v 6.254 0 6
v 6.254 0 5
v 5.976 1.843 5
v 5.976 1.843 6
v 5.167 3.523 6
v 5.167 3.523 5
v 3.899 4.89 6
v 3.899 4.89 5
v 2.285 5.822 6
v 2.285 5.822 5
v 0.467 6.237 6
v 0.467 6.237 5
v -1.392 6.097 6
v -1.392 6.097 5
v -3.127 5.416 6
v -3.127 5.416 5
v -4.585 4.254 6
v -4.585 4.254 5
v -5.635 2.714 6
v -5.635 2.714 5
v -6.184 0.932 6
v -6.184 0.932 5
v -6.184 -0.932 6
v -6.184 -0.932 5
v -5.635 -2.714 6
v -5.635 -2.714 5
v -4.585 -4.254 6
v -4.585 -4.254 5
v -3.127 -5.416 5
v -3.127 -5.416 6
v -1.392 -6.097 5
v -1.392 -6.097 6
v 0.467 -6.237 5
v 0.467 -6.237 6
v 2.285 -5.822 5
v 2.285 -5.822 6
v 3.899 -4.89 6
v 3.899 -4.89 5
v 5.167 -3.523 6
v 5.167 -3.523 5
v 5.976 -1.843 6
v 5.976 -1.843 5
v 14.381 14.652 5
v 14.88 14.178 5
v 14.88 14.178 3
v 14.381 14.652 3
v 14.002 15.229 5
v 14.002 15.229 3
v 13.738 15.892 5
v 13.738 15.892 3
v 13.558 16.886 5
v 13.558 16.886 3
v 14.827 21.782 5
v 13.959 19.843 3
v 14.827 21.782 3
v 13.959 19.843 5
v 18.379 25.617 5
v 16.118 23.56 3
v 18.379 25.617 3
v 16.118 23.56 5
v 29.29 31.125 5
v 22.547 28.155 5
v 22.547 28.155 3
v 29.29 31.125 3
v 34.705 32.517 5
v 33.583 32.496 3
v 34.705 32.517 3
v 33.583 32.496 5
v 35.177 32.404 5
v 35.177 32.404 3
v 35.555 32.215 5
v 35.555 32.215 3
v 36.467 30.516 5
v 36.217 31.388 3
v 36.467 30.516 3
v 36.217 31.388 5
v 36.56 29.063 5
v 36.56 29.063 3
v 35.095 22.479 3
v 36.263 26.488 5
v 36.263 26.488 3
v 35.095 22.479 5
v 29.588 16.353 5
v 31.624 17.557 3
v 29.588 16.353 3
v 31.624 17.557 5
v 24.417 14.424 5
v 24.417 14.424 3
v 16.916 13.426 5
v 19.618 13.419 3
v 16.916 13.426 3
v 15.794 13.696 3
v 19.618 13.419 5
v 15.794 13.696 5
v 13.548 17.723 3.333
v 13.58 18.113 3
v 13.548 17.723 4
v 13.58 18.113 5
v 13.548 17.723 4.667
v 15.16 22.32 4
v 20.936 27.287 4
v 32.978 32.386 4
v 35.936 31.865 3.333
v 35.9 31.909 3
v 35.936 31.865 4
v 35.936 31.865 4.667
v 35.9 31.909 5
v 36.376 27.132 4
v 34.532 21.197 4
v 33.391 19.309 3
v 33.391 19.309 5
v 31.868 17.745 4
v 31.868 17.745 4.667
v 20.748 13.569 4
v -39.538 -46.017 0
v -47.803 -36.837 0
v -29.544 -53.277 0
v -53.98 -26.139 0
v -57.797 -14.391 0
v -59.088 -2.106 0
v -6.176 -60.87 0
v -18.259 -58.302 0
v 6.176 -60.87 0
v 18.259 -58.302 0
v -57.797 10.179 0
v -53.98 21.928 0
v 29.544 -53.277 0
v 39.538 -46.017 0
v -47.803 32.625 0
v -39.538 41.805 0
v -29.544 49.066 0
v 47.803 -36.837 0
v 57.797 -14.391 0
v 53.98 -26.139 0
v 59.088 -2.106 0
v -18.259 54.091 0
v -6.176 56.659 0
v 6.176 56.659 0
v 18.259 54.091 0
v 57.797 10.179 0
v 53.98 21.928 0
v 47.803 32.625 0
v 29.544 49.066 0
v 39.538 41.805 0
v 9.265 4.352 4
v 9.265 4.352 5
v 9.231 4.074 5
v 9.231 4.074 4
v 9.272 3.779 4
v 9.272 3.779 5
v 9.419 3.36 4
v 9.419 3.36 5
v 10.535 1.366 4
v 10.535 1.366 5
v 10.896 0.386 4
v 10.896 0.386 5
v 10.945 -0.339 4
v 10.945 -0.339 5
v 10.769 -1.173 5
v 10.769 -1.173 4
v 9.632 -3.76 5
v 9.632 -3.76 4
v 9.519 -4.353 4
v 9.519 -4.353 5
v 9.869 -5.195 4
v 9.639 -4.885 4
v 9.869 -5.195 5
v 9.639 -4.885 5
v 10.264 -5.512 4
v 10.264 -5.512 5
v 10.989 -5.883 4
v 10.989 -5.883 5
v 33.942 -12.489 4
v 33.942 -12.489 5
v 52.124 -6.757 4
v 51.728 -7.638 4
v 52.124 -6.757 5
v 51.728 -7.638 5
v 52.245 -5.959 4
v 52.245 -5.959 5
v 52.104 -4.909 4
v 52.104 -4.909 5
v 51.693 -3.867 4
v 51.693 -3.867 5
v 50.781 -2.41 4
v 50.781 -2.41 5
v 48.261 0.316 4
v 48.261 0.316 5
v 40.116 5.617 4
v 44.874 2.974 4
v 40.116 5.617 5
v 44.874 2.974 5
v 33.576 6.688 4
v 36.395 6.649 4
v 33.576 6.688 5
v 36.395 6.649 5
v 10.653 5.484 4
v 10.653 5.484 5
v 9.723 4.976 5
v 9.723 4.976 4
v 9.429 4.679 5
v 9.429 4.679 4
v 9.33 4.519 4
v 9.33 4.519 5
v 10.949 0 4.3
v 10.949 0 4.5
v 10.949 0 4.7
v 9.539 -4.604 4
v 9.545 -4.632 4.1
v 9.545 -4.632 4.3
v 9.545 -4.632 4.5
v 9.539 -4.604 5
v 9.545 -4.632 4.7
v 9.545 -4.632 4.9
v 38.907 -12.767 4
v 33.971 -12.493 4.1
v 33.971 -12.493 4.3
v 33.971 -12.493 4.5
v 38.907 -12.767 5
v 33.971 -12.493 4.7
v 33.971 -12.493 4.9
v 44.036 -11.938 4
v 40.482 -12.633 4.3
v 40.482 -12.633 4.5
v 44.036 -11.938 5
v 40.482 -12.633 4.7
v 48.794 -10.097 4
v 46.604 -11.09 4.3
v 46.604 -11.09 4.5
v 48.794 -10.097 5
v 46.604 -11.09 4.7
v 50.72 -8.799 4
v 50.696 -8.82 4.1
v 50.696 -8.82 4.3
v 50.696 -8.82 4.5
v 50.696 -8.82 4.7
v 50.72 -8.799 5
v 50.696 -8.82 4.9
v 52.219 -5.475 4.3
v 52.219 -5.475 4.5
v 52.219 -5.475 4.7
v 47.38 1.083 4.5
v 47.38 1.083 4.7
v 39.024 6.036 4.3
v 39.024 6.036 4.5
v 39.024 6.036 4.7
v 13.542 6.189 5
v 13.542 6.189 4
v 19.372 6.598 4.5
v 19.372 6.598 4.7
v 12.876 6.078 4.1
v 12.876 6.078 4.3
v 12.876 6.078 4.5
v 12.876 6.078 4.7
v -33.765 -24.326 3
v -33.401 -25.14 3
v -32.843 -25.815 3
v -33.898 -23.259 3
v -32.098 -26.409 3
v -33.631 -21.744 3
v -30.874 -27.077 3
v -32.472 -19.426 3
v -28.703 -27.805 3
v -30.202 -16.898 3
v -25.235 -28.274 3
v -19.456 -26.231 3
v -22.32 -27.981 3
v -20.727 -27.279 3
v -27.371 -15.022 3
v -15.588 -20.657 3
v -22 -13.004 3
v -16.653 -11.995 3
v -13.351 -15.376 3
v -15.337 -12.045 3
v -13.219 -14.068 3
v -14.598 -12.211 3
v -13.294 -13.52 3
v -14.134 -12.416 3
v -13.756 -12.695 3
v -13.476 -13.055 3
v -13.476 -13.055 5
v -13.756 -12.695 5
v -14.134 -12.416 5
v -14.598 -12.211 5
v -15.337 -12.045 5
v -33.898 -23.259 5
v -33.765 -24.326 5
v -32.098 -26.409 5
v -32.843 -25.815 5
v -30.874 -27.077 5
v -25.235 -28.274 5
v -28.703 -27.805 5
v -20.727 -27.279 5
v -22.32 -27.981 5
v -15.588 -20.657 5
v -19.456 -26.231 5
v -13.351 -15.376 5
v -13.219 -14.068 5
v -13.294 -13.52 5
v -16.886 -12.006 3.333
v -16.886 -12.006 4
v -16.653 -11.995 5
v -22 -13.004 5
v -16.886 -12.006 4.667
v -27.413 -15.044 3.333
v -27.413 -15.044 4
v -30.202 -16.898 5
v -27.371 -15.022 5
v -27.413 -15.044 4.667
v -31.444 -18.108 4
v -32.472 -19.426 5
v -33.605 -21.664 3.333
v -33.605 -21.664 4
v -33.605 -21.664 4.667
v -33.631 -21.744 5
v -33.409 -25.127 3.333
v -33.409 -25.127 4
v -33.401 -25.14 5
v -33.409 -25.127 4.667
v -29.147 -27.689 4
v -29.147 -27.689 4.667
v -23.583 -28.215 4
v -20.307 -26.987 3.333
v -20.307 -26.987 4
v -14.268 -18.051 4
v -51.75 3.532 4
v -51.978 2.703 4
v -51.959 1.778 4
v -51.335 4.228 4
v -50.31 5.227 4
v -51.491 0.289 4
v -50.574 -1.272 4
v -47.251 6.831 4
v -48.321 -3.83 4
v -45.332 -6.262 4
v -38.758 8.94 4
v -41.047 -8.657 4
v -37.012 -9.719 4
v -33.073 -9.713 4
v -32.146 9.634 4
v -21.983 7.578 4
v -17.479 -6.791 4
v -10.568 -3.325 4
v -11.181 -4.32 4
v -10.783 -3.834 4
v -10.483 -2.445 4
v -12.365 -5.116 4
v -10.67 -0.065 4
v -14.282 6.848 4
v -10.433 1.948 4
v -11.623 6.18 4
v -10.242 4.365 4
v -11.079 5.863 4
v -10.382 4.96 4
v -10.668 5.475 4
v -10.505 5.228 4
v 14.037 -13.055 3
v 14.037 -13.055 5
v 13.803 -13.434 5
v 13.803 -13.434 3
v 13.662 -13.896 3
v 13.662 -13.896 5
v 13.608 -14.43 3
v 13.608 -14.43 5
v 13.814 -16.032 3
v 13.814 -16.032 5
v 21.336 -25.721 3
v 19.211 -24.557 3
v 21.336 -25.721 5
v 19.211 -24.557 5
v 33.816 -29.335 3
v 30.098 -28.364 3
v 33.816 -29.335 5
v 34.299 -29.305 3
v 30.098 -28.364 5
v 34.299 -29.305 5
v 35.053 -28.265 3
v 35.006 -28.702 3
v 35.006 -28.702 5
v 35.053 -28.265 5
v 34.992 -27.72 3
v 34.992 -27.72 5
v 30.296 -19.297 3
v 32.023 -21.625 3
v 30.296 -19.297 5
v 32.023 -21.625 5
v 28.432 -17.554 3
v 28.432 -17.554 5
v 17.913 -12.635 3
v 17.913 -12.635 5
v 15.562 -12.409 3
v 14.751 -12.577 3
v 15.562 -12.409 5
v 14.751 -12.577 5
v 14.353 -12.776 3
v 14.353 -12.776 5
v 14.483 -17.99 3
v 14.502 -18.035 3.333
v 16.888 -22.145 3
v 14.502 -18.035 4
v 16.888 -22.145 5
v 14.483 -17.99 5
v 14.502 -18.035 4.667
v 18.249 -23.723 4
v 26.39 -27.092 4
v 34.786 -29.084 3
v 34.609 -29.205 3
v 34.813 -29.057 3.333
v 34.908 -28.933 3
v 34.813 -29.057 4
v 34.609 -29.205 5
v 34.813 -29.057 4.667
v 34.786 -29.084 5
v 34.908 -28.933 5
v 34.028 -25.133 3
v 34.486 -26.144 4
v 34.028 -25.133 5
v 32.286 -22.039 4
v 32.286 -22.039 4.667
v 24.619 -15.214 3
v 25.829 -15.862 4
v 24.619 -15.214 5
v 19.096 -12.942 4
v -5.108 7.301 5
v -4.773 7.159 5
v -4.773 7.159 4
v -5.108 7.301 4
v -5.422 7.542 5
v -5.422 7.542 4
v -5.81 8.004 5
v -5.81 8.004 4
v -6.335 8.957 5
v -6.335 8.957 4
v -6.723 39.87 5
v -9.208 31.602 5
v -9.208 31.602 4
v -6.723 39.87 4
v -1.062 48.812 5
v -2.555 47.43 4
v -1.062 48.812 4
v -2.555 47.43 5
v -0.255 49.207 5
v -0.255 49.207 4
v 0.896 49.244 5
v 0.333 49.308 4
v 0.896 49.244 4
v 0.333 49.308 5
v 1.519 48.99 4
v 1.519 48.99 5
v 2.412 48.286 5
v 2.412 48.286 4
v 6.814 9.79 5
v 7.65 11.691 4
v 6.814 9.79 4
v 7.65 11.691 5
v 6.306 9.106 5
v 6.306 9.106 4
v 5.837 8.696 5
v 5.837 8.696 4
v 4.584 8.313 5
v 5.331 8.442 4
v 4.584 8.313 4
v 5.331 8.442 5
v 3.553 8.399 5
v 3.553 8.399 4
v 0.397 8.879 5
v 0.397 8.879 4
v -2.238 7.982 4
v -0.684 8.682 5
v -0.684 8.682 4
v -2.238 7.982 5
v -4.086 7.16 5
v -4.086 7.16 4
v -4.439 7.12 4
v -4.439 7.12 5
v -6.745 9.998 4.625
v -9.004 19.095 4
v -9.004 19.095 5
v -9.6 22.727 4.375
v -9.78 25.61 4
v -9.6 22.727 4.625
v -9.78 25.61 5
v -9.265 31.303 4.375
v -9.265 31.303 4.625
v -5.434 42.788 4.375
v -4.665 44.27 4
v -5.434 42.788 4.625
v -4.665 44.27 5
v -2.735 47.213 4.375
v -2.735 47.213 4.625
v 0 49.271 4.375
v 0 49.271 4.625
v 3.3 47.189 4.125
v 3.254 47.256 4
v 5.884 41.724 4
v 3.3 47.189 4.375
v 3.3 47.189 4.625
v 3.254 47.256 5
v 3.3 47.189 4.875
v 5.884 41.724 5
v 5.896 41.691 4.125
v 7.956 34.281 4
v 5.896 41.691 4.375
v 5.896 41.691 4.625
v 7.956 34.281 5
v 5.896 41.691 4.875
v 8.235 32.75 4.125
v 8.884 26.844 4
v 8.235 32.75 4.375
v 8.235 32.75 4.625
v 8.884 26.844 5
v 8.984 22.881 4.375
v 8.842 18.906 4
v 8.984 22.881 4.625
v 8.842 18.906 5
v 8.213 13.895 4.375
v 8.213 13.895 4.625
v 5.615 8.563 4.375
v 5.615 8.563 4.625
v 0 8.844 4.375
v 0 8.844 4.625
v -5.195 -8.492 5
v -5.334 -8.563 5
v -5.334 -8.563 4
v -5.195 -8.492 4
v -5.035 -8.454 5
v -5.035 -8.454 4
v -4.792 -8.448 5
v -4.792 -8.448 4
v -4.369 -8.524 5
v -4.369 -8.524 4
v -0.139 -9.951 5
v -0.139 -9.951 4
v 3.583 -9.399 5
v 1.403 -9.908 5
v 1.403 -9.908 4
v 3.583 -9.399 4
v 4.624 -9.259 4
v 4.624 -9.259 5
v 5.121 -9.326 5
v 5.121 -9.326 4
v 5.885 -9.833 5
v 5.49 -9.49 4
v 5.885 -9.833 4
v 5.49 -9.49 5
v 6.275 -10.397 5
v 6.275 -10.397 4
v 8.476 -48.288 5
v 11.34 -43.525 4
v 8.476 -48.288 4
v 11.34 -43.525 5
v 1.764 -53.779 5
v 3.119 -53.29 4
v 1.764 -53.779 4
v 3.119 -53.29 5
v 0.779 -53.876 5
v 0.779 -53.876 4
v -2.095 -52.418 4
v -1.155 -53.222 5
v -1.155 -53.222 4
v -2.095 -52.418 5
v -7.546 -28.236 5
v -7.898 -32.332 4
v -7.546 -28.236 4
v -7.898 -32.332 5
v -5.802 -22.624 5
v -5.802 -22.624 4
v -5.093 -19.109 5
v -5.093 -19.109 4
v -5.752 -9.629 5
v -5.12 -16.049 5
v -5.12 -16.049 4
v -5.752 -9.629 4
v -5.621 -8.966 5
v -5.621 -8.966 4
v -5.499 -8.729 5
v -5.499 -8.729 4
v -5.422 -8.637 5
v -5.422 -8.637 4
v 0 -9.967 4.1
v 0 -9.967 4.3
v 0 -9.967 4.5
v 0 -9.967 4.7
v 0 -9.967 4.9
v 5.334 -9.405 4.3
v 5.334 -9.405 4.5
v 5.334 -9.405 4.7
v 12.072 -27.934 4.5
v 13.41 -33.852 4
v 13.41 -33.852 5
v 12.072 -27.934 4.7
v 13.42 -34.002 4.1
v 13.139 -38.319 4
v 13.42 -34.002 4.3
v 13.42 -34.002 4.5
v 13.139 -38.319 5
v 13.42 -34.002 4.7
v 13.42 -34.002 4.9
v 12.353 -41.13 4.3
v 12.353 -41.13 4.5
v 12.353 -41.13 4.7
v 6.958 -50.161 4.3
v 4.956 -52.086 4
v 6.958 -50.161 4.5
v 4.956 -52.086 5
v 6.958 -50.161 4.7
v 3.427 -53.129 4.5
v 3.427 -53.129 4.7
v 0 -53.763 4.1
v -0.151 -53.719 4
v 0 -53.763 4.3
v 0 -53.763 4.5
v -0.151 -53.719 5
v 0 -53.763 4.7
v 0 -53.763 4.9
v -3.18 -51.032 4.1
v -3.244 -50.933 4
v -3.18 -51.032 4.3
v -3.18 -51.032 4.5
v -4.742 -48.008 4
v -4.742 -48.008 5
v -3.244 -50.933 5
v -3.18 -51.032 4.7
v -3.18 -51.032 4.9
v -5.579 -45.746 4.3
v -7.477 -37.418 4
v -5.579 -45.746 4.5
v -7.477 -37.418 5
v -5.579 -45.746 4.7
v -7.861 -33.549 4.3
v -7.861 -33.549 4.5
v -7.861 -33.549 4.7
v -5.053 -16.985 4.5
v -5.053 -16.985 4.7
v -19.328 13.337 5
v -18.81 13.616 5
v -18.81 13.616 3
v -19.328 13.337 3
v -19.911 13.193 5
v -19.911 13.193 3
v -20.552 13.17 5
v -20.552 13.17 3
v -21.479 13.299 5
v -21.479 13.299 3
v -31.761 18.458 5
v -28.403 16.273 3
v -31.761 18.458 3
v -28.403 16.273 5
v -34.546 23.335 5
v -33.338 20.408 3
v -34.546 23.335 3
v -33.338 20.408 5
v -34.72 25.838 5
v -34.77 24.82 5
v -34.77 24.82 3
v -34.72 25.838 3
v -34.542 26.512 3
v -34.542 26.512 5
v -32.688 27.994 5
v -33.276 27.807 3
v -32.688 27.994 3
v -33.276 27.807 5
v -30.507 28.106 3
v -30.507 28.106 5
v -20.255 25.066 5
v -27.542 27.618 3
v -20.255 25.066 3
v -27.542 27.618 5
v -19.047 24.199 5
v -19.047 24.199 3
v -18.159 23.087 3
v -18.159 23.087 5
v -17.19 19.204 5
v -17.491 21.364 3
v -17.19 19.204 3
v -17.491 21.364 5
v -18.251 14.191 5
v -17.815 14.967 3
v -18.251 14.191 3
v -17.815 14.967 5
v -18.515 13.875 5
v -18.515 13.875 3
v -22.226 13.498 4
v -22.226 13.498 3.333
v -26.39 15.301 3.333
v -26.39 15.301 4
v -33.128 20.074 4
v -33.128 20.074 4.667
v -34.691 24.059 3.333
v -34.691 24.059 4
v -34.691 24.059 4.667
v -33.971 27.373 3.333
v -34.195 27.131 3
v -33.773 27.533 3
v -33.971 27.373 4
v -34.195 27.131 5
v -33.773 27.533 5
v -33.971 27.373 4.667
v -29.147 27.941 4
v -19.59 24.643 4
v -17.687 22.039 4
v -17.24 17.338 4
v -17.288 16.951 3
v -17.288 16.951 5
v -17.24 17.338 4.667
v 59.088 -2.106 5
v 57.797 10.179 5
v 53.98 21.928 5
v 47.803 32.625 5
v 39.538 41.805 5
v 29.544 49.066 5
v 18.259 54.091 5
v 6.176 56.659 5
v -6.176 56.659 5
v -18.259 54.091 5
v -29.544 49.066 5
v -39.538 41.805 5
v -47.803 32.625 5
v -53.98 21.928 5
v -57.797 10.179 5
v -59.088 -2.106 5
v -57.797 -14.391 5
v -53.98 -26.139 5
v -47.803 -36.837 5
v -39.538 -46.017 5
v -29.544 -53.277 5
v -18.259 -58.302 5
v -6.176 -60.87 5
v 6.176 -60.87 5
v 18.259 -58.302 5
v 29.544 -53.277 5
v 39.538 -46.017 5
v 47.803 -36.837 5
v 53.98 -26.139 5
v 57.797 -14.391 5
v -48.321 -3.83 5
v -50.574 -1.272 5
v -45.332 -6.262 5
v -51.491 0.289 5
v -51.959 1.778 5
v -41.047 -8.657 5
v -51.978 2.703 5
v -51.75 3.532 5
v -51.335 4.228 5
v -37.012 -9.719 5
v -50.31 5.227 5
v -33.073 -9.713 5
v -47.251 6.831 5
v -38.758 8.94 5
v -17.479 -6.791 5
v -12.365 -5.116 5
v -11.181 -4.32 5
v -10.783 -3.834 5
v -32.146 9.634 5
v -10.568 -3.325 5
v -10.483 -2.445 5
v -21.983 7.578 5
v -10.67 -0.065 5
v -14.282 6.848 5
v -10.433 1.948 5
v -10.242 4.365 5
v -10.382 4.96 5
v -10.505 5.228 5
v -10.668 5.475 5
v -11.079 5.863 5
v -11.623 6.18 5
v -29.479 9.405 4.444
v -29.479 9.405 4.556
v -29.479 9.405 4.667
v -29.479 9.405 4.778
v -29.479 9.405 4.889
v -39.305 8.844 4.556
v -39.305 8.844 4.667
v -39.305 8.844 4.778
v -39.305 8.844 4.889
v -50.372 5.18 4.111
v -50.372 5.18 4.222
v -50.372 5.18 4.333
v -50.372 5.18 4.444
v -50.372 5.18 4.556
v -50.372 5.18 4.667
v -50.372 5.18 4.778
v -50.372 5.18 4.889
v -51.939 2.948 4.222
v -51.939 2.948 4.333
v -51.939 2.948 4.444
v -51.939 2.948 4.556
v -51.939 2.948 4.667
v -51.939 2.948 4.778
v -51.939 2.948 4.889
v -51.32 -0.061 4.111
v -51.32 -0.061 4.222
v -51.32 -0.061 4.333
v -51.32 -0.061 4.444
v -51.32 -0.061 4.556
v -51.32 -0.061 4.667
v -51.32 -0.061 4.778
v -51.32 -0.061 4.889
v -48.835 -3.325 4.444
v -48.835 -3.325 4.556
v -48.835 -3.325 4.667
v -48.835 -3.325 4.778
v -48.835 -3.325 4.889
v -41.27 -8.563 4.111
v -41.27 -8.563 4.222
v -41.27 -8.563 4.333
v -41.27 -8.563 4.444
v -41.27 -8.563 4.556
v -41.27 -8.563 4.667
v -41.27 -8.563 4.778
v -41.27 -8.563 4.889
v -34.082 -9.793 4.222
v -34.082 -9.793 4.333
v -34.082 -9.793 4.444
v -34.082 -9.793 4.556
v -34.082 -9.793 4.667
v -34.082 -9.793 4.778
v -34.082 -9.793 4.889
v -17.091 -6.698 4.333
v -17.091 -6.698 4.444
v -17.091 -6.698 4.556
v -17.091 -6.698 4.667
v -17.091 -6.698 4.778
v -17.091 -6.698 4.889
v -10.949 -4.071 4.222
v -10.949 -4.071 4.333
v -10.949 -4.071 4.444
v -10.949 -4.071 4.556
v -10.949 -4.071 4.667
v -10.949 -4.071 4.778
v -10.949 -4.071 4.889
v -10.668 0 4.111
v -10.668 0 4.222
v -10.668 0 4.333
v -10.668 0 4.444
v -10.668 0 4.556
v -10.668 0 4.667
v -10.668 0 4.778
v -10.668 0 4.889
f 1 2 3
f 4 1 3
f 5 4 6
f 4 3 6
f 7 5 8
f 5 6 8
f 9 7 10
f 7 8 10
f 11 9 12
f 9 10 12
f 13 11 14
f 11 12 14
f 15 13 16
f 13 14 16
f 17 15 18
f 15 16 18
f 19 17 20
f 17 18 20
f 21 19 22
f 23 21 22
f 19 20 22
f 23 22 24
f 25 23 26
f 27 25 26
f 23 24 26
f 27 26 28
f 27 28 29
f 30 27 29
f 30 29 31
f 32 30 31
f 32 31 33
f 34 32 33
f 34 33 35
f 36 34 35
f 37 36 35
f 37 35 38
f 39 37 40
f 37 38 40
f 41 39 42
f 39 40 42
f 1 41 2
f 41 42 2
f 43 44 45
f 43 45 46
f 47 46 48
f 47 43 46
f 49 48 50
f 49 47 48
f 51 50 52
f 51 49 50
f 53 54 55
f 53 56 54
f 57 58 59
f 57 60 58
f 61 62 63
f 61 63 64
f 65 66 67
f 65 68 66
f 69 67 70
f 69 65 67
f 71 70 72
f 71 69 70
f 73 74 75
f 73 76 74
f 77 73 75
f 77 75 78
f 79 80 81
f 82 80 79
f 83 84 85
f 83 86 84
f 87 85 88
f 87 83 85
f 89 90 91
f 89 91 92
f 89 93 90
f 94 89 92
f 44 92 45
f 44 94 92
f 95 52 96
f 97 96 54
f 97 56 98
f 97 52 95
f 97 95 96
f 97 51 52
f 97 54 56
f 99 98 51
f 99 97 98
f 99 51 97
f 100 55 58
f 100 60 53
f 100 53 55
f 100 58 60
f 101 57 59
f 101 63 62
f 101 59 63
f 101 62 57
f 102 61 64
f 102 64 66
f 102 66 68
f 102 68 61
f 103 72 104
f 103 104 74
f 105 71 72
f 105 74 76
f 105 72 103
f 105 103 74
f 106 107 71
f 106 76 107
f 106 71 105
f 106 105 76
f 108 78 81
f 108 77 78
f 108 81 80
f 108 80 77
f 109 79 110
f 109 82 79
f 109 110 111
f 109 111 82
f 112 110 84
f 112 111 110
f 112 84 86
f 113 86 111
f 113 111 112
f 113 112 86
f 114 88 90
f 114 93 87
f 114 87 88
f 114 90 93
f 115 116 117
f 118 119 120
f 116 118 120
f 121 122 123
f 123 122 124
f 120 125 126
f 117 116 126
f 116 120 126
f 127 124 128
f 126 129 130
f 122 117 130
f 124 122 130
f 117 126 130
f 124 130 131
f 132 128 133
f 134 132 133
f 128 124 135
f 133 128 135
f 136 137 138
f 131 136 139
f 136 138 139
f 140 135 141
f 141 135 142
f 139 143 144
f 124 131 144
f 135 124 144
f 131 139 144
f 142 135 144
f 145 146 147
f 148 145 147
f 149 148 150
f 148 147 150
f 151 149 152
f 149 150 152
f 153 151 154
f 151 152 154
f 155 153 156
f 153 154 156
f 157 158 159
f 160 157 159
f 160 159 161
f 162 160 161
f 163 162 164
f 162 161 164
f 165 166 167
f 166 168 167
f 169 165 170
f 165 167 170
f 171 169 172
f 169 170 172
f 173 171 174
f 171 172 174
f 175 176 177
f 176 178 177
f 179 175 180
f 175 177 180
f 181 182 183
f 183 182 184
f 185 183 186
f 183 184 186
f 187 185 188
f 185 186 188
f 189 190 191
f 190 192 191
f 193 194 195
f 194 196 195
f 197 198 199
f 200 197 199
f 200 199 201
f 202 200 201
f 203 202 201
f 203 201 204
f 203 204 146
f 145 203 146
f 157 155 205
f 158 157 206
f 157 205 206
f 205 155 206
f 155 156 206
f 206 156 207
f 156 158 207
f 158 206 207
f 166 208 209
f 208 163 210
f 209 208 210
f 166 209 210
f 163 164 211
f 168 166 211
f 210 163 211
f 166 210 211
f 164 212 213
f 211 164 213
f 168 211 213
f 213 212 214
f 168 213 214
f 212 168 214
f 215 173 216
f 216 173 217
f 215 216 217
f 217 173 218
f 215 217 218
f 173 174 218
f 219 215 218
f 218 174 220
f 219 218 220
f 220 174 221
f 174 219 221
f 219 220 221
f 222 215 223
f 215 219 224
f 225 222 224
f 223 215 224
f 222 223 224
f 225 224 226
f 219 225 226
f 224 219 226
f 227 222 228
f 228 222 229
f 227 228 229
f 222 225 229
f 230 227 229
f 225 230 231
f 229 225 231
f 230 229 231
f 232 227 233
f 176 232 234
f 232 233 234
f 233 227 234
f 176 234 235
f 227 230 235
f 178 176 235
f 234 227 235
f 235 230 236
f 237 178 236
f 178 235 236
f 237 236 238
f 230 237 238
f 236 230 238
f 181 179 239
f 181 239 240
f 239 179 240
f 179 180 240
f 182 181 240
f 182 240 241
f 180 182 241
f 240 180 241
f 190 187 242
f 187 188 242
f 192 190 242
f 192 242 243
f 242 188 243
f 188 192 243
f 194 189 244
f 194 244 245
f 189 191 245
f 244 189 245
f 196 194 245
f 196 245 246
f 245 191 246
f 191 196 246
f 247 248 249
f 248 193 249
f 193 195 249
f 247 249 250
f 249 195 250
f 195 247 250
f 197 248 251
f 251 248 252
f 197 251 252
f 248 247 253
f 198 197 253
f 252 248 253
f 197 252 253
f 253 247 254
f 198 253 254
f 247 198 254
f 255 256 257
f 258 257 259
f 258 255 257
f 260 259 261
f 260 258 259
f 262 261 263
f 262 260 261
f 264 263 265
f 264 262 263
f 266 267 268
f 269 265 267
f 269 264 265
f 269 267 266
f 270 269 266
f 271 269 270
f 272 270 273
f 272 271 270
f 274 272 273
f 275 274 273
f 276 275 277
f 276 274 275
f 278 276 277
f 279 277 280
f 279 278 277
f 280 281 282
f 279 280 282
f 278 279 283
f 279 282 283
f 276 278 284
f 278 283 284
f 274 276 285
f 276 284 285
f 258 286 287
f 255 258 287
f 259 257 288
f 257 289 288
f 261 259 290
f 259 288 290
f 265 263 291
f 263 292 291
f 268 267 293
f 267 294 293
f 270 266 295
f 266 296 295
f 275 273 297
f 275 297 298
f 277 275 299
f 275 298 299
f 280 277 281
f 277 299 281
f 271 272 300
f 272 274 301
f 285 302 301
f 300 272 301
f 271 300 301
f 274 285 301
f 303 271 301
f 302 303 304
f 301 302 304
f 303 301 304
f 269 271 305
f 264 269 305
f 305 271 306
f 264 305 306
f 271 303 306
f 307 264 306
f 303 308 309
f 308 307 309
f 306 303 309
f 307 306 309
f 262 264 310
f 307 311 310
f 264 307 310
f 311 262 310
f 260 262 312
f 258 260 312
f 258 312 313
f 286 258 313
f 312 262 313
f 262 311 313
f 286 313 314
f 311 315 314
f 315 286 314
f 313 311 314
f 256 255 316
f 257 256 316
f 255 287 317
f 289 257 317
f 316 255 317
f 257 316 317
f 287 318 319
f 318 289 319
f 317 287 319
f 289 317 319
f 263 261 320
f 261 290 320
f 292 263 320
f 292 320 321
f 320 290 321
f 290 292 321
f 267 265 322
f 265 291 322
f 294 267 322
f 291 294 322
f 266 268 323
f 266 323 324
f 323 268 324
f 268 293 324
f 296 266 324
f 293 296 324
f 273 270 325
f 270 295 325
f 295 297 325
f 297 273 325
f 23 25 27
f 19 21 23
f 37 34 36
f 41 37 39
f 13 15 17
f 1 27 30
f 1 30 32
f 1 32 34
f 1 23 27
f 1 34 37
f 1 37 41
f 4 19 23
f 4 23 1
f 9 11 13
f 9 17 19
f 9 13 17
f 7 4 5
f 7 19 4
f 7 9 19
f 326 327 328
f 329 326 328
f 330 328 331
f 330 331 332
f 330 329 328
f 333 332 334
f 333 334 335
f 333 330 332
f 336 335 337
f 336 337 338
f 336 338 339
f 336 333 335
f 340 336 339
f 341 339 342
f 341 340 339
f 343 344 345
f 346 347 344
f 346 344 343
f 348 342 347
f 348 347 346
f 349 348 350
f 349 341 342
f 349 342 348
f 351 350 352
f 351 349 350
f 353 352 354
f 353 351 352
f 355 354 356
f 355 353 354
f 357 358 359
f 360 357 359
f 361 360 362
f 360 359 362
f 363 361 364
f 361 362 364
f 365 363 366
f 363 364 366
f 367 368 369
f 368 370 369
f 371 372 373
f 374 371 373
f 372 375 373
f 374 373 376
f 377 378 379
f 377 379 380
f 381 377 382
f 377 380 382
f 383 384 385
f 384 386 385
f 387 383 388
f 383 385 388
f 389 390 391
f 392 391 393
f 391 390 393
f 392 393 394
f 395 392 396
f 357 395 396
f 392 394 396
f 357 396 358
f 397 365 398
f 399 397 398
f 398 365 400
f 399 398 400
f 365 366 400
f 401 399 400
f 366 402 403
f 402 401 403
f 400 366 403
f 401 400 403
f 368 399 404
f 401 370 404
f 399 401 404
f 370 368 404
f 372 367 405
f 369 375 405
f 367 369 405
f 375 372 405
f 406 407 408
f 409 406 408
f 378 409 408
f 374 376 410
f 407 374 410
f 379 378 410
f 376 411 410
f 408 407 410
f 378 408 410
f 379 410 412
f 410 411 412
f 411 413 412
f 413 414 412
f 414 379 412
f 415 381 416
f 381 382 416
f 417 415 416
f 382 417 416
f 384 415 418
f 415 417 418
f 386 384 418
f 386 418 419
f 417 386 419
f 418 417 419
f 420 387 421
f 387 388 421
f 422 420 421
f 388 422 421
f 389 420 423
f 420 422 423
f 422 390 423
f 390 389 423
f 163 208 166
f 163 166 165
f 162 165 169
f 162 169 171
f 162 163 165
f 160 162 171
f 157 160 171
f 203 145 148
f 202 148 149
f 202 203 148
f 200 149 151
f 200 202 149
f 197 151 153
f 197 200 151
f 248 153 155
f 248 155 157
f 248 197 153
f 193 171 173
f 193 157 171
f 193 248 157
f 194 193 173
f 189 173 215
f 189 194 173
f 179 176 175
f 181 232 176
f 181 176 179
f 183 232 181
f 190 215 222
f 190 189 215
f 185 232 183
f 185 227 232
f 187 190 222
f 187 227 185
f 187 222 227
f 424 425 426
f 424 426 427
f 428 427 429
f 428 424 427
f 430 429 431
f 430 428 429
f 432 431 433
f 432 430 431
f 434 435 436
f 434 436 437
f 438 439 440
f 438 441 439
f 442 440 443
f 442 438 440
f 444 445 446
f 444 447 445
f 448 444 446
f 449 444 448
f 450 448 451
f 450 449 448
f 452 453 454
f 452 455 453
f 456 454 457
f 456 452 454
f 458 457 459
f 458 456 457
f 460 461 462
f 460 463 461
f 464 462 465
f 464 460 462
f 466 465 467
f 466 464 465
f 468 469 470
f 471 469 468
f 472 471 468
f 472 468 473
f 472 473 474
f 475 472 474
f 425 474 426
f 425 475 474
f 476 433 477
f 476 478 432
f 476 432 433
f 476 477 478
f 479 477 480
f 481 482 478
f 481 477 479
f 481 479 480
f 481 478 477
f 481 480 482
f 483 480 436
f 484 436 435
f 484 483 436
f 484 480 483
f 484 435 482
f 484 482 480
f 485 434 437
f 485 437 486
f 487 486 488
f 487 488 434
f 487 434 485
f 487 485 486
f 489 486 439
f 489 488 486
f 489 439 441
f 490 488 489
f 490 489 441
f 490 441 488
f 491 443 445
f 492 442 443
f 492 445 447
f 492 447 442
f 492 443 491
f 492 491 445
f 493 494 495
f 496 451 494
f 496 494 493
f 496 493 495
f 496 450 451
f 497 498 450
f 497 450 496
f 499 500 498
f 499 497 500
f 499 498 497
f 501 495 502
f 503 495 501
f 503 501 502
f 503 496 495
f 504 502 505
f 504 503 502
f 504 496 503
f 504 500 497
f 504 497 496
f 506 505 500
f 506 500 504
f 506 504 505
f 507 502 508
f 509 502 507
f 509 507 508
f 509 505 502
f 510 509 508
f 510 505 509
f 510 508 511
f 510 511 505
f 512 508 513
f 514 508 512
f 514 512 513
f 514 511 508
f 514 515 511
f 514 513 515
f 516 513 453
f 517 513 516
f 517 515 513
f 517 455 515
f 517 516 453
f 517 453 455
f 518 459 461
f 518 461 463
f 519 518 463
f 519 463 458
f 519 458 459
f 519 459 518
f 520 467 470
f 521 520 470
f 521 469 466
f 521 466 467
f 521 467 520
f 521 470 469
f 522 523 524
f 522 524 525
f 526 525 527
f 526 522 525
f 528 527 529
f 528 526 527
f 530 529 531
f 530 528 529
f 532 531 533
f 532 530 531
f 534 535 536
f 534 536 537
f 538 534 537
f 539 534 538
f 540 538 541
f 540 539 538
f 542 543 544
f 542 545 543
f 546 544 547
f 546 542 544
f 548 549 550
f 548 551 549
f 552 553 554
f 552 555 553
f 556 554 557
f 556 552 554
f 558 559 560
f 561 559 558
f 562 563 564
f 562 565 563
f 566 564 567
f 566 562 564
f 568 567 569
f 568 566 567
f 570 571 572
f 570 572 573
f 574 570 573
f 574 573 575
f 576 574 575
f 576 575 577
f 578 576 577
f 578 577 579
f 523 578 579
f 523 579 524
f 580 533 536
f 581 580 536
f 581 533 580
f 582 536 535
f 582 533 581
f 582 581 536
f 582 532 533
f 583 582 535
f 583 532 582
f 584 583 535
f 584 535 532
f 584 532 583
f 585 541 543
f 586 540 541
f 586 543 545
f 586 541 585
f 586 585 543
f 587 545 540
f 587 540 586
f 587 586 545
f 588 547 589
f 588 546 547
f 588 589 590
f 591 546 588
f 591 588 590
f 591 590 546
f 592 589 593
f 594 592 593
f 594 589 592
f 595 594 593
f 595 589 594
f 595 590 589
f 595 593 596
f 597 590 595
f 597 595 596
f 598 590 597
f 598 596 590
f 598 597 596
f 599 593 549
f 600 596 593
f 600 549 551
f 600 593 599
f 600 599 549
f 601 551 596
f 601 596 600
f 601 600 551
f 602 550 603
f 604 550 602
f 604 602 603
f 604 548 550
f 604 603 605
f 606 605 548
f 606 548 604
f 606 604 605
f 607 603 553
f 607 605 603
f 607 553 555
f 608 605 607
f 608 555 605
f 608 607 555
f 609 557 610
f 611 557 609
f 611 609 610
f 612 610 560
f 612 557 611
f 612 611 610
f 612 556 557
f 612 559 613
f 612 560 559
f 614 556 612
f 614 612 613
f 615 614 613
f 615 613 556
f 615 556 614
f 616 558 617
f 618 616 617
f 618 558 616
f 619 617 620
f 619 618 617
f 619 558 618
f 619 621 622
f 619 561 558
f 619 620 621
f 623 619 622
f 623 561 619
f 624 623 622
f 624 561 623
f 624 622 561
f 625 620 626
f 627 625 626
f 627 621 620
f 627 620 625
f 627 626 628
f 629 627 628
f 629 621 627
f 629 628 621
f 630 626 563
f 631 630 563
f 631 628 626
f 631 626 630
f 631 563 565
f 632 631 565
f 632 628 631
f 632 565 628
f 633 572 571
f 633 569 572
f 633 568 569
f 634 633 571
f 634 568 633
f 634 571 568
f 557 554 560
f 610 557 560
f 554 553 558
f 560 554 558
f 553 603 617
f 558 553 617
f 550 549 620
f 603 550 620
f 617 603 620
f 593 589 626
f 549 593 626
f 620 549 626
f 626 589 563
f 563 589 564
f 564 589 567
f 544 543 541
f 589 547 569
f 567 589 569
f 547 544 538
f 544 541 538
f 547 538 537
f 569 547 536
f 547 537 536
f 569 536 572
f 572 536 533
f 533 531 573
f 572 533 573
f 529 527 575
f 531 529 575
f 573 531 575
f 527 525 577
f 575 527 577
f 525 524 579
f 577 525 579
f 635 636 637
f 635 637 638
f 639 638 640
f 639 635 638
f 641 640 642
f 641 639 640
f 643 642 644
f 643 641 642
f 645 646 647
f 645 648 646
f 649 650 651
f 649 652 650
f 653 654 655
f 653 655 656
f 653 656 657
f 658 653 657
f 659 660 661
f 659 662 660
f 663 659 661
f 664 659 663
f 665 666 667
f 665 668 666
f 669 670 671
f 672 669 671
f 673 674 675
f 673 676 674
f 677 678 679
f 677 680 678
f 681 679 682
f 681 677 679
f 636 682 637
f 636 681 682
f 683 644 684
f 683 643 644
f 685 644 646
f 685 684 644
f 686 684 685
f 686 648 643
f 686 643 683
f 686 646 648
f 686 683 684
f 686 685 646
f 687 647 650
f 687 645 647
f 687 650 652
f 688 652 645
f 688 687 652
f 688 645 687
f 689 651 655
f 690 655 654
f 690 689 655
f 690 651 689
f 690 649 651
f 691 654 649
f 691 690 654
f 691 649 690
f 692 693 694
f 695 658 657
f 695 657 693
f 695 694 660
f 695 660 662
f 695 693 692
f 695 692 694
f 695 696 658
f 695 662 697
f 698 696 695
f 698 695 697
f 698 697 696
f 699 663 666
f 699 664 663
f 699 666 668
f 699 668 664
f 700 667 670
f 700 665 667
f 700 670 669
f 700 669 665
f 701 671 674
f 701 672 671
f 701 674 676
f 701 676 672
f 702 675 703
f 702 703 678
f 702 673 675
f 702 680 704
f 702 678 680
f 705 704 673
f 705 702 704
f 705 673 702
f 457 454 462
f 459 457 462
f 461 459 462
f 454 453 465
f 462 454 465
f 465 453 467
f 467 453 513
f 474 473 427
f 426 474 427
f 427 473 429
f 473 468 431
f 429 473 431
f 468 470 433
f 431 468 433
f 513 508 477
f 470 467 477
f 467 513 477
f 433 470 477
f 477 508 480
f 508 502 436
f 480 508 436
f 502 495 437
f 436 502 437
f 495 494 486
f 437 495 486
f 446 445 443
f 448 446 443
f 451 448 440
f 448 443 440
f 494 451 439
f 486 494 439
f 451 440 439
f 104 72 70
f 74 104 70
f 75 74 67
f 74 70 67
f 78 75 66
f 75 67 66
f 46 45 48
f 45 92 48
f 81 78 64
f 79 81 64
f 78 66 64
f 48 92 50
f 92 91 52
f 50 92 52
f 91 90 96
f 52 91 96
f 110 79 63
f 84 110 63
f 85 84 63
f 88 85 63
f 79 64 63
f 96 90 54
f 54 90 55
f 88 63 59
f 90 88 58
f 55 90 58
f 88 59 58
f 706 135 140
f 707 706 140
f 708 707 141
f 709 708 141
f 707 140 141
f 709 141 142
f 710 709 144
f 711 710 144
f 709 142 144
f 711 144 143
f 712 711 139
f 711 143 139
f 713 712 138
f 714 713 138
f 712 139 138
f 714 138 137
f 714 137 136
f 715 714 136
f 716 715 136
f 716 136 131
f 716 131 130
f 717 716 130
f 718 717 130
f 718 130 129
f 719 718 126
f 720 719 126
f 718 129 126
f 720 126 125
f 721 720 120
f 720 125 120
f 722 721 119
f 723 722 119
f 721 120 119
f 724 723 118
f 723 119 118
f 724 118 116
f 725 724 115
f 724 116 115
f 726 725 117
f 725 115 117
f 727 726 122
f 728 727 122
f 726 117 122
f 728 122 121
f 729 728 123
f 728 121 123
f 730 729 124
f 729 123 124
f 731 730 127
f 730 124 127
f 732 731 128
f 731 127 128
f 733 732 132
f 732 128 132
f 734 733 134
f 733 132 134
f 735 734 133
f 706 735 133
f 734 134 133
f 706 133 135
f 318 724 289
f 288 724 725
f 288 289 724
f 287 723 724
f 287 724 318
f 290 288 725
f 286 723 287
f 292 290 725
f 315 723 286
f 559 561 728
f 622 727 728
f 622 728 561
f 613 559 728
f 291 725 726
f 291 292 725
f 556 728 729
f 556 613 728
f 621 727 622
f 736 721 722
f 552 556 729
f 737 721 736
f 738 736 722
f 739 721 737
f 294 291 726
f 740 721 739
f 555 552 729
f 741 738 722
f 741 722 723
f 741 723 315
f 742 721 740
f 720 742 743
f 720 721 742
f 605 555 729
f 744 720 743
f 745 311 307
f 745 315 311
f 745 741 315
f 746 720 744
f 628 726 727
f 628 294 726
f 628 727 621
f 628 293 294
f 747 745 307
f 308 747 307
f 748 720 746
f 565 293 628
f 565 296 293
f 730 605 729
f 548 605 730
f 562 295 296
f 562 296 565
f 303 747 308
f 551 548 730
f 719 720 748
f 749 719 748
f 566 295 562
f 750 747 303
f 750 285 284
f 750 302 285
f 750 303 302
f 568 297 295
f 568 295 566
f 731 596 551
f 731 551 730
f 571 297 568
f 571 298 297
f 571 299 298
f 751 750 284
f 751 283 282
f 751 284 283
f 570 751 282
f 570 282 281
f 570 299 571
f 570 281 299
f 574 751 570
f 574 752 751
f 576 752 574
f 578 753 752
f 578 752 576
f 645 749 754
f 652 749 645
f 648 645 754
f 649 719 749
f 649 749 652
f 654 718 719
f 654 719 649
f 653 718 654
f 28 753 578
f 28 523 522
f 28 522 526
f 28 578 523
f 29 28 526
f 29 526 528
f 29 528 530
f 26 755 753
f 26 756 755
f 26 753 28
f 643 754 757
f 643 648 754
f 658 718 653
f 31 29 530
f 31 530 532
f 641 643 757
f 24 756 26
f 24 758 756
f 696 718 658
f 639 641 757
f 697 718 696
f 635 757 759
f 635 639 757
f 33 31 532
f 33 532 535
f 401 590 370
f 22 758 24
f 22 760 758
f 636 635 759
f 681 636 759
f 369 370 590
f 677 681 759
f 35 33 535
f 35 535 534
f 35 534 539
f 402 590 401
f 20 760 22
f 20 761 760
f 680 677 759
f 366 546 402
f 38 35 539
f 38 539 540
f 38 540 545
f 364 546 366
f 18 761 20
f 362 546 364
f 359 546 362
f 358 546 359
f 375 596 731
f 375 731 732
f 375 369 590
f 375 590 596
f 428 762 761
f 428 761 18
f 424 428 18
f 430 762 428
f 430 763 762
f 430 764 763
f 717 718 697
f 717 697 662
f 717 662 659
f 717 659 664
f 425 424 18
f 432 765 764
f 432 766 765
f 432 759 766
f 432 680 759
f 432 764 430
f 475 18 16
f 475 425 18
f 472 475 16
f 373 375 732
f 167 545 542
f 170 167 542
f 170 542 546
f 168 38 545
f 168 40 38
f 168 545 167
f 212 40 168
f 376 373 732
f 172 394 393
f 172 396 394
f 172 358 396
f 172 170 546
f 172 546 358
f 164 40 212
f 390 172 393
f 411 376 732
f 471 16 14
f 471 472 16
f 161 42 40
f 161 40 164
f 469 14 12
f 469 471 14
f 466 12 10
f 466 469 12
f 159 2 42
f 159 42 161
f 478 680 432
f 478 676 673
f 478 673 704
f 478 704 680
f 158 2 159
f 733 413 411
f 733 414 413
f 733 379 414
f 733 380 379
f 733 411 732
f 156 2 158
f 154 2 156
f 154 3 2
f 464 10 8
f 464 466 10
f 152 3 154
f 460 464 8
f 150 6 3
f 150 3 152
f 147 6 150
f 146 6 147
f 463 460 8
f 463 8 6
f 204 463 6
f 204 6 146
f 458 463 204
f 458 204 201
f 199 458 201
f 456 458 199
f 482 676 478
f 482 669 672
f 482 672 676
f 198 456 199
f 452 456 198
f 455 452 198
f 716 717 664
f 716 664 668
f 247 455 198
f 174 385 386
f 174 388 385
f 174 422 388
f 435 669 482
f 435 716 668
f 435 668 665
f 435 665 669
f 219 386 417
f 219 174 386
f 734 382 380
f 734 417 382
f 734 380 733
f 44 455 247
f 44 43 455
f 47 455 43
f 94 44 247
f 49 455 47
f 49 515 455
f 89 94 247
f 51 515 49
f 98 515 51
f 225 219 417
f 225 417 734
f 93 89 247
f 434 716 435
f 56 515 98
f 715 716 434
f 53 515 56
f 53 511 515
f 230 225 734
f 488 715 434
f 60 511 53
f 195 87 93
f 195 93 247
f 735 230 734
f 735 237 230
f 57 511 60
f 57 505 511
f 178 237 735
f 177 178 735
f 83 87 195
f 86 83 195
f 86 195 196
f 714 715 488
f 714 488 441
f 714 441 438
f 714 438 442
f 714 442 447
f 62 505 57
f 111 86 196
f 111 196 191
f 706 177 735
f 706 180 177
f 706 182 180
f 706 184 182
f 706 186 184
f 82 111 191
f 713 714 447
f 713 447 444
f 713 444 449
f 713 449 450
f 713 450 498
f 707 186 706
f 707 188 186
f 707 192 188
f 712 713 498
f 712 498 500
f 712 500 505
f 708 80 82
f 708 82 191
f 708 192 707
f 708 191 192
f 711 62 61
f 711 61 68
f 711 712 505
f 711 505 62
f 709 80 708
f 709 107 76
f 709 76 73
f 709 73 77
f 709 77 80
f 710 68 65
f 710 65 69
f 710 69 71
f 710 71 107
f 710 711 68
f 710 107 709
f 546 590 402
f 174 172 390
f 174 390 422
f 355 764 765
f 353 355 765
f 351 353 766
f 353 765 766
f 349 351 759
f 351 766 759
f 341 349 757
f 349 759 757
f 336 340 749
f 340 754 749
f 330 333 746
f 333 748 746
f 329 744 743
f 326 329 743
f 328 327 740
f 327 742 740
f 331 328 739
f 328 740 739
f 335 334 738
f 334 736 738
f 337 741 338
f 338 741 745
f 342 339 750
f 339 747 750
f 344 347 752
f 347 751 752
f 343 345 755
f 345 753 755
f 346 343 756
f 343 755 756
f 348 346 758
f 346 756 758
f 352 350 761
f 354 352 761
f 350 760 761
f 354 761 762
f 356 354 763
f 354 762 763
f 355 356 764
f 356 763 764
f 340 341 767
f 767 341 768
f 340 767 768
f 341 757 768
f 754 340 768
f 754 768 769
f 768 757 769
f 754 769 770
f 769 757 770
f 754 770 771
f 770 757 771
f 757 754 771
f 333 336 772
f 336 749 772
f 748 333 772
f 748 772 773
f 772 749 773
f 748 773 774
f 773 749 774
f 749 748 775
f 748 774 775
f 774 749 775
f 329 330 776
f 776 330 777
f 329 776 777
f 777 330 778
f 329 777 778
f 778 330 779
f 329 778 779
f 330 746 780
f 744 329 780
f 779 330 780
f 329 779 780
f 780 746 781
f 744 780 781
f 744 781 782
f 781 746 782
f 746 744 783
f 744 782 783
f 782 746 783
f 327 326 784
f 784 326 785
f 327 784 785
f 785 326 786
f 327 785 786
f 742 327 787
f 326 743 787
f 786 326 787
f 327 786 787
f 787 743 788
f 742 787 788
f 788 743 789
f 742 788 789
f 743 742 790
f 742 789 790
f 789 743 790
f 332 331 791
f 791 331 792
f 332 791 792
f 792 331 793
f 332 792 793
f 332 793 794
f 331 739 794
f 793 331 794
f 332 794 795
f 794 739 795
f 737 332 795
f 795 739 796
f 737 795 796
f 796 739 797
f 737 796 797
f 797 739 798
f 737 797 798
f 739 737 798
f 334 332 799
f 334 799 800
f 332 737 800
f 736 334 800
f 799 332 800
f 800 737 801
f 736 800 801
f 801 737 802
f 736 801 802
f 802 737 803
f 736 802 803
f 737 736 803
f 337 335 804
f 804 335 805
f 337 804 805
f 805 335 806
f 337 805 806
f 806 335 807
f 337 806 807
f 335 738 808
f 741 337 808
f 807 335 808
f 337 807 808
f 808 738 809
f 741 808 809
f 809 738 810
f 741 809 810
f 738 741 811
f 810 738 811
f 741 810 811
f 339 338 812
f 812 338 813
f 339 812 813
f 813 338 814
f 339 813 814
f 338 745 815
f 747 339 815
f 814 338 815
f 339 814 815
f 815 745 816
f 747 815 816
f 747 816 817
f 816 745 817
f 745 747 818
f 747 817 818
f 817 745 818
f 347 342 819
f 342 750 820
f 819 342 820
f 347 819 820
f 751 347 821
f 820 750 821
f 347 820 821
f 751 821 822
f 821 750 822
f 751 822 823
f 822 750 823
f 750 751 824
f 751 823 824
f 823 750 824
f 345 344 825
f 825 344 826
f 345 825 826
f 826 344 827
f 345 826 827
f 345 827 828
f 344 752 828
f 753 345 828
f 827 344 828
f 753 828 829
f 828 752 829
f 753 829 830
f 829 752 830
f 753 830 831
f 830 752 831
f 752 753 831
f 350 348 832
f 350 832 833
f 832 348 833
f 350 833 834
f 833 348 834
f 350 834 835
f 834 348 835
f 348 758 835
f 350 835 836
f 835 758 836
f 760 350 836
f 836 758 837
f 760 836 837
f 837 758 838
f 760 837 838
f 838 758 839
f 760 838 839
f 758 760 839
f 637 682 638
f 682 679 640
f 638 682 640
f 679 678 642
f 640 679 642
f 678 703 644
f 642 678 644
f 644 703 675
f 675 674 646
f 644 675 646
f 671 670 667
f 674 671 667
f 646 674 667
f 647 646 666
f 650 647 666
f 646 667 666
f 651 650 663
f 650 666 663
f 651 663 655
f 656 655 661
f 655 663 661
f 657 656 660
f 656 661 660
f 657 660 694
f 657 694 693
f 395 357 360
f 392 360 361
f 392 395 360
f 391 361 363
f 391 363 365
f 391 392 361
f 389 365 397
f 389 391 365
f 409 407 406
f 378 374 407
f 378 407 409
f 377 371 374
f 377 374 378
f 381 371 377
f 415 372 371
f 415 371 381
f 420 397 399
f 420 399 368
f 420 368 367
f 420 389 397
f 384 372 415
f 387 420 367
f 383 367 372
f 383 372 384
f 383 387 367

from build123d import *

# Parameters (mm, degrees)
F0_R     = 59.0880936476
F1_DEPTH = 5
F2_R     = 6.2541458164
F4_DEPTH = 1
F5_DEPTH = 1
F7_DEPTH = 2


with BuildPart() as f1:
    # F0 (on Top) → F1 (new body)
    with BuildSketch(Plane.XY):
        with Locations((0, -2.1056151018)):
            Circle(F0_R)
    extrude(amount=F1_DEPTH)

    # F2 (on face) → F4 (join)
    with BuildSketch(Plane.XY.offset(5)):
        Circle(F2_R)
    extrude(amount=F4_DEPTH)

    # F3 (on face) → F5 (cut)
    with BuildSketch(Plane.XY.offset(5)):
        with BuildLine():
            add(Edge.make_bspline(
                [(-4.7727273777, 7.1590915322), (-6.4085462642, 7.5826188619), (-8.4425893593, 17.0006860771), (-11.8022056723, 29.7717877031), (-0.4846107398, 55.4650055698), (7.2364784999, 40.2168270371), (9.9385199312, 24.5727673402), (7.5472832072, 5.5833376772), (-0.0780264695, 10.4088109322), (-3.532940639, 6.8381002714), (-4.7727273777, 7.1590915322)],
                knots=[0, 0, 0, 0, 0.1083711566, 0.2545974371, 0.418747804, 0.5318838777, 0.6912807851, 0.8313008397, 0.9178655266, 1, 1, 1, 1], degree=3))
        make_face()
        with BuildLine():
            add(Edge.make_bspline(
                [(-10.6684491038, 5.4745990783), (-12.0561691308, 7.2253596345), (-21.8791208512, 6.6913791481), (-29.4891331724, 10.1232660852), (-38.5245708395, 9.2783692303), (-58.5554832425, 4.6689669232), (-40.4078078708, -11.8402187561), (-27.8721878336, -8.5519321006), (-8.8009851807, -5.6384065776), (-11.4468848959, -0.0927082515), (-9.6698295121, 4.2147312679), (-10.6684491038, 5.4745990783)],
                knots=[0, 0, 0, 0, 0.111151783, 0.2116860031, 0.3189330474, 0.4465756354, 0.5820040709, 0.7138708157, 0.8509586515, 0.9200138746, 1, 1, 1, 1], degree=3))
        make_face()
        with BuildLine():
            add(Edge.make_bspline(
                [(-5.3342245519, -8.5628349334), (-4.4786799615, -7.9736803873), (0.1321944458, -11.5276932912), (6.5094929194, -7.1786809191), (7.7925295931, -18.0493088432), (12.5937168704, -27.9592025979), (15.2386785589, -40.5808267294), (-2.2344329407, -63.4221883959), (-9.3151225032, -32.5510137398), (-6.5517675744, -24.8541403122), (-4.0786180579, -17.8255645054), (-6.3917164173, -9.2910566379), (-5.3342245519, -8.5628349334)],
                knots=[0, 0, 0, 0, 0.0731488102, 0.1452817606, 0.233833908, 0.3400653345, 0.4532163707, 0.5841380712, 0.7291880487, 0.8231072311, 0.9095847574, 1, 1, 1, 1], degree=3))
        make_face()
        with BuildLine():
            add(Edge.make_bspline(
                [(9.2647057027, 4.3516047299), (8.9571380145, 3.2492611123), (12.7824592675, 0.0498091413), (6.8411175325, -5.9264798552), (19.8045058403, -7.2302473149), (33.5224767675, -13.9041118827), (46.0840418949, -12.1328084491), (56.7905325681, -5.4761697374), (38.818909156, 8.4283733616), (30.0590091206, 5.632261363), (20.4955228271, 7.1441859852), (9.7228474514, 5.993616073), (9.2647057027, 4.3516047299)],
                knots=[0, 0, 0, 0, 0.0685699291, 0.1384074135, 0.2348713438, 0.3635401519, 0.4767141252, 0.5661641833, 0.6989939822, 0.7941615915, 0.8978607037, 1, 1, 1, 1], degree=3))
        make_face()
    extrude(amount=-F5_DEPTH, mode=Mode.SUBTRACT)

    # F6 (on face) → F7 (cut)
    with BuildSketch(Plane.XY.offset(5)):
        with BuildLine():
            add(Edge.make_bspline(
                [(-18.8101604581, 13.6163104326), (-20.5254717132, 12.3583074837), (-26.9248008538, 15.6865490851), (-33.7275755806, 18.5668931693), (-36.5578089612, 30.3630531403), (-22.3411679187, 26.3206684702), (-16.5918168832, 23.4293571667), (-17.015834157, 14.9322627248), (-18.8101604581, 13.6163104326)],
                knots=[0, 0, 0, 0, 0.1619140666, 0.3288782161, 0.4863822939, 0.679151516, 0.8306274343, 1, 1, 1, 1], degree=3))
        make_face()
        with BuildLine():
            add(Edge.make_bspline(
                [(-13.4759368375, -13.0548132583), (-14.4909029516, -11.2689861927), (-23.239810669, -12.8996365593), (-31.7467546738, -16.72157874), (-36.2297698541, -26.5959138687), (-22.5113531956, -29.4588233332), (-17.7730881422, -24.9978905765), (-12.2975665768, -15.1281489841), (-13.4759368375, -13.0548132583)],
                knots=[0, 0, 0, 0, 0.1618756315, 0.3401283677, 0.4882660713, 0.6643671021, 0.8120632527, 1, 1, 1, 1], degree=3))
        make_face()
        with BuildLine():
            add(Edge.make_bspline(
                [(14.037434943, -13.0548132583), (12.4814272274, -14.8955685048), (18.0129656253, -26.232593731), (25.442948431, -26.0476454266), (37.711765373, -31.9321015834), (31.852347262, -20.690854796), (27.4563394325, -15.8966958652), (15.6370265264, -11.162498349), (14.037434943, -13.0548132583)],
                knots=[0, 0, 0, 0, 0.1830838261, 0.3435542177, 0.5025378944, 0.6501891248, 0.8117879852, 1, 1, 1, 1], degree=3))
        make_face()
        with BuildLine():
            add(Edge.make_bspline(
                [(14.87968117, 14.1778076068), (12.8784763814, 15.6754514193), (13.734838999, 24.6090932726), (27.4657251112, 30.4174078857), (38.3109506254, 34.7821627022), (35.1340804737, 19.5551832527), (28.8660402407, 15.366463644), (17.4067531204, 12.2866200121), (14.87968117, 14.1778076068)],
                knots=[0, 0, 0, 0, 0.1469348173, 0.3506164253, 0.4931233357, 0.6619931863, 0.8144543439, 1, 1, 1, 1], degree=3))
        make_face()
    extrude(amount=-F7_DEPTH, mode=Mode.SUBTRACT)


solid = f1.part
